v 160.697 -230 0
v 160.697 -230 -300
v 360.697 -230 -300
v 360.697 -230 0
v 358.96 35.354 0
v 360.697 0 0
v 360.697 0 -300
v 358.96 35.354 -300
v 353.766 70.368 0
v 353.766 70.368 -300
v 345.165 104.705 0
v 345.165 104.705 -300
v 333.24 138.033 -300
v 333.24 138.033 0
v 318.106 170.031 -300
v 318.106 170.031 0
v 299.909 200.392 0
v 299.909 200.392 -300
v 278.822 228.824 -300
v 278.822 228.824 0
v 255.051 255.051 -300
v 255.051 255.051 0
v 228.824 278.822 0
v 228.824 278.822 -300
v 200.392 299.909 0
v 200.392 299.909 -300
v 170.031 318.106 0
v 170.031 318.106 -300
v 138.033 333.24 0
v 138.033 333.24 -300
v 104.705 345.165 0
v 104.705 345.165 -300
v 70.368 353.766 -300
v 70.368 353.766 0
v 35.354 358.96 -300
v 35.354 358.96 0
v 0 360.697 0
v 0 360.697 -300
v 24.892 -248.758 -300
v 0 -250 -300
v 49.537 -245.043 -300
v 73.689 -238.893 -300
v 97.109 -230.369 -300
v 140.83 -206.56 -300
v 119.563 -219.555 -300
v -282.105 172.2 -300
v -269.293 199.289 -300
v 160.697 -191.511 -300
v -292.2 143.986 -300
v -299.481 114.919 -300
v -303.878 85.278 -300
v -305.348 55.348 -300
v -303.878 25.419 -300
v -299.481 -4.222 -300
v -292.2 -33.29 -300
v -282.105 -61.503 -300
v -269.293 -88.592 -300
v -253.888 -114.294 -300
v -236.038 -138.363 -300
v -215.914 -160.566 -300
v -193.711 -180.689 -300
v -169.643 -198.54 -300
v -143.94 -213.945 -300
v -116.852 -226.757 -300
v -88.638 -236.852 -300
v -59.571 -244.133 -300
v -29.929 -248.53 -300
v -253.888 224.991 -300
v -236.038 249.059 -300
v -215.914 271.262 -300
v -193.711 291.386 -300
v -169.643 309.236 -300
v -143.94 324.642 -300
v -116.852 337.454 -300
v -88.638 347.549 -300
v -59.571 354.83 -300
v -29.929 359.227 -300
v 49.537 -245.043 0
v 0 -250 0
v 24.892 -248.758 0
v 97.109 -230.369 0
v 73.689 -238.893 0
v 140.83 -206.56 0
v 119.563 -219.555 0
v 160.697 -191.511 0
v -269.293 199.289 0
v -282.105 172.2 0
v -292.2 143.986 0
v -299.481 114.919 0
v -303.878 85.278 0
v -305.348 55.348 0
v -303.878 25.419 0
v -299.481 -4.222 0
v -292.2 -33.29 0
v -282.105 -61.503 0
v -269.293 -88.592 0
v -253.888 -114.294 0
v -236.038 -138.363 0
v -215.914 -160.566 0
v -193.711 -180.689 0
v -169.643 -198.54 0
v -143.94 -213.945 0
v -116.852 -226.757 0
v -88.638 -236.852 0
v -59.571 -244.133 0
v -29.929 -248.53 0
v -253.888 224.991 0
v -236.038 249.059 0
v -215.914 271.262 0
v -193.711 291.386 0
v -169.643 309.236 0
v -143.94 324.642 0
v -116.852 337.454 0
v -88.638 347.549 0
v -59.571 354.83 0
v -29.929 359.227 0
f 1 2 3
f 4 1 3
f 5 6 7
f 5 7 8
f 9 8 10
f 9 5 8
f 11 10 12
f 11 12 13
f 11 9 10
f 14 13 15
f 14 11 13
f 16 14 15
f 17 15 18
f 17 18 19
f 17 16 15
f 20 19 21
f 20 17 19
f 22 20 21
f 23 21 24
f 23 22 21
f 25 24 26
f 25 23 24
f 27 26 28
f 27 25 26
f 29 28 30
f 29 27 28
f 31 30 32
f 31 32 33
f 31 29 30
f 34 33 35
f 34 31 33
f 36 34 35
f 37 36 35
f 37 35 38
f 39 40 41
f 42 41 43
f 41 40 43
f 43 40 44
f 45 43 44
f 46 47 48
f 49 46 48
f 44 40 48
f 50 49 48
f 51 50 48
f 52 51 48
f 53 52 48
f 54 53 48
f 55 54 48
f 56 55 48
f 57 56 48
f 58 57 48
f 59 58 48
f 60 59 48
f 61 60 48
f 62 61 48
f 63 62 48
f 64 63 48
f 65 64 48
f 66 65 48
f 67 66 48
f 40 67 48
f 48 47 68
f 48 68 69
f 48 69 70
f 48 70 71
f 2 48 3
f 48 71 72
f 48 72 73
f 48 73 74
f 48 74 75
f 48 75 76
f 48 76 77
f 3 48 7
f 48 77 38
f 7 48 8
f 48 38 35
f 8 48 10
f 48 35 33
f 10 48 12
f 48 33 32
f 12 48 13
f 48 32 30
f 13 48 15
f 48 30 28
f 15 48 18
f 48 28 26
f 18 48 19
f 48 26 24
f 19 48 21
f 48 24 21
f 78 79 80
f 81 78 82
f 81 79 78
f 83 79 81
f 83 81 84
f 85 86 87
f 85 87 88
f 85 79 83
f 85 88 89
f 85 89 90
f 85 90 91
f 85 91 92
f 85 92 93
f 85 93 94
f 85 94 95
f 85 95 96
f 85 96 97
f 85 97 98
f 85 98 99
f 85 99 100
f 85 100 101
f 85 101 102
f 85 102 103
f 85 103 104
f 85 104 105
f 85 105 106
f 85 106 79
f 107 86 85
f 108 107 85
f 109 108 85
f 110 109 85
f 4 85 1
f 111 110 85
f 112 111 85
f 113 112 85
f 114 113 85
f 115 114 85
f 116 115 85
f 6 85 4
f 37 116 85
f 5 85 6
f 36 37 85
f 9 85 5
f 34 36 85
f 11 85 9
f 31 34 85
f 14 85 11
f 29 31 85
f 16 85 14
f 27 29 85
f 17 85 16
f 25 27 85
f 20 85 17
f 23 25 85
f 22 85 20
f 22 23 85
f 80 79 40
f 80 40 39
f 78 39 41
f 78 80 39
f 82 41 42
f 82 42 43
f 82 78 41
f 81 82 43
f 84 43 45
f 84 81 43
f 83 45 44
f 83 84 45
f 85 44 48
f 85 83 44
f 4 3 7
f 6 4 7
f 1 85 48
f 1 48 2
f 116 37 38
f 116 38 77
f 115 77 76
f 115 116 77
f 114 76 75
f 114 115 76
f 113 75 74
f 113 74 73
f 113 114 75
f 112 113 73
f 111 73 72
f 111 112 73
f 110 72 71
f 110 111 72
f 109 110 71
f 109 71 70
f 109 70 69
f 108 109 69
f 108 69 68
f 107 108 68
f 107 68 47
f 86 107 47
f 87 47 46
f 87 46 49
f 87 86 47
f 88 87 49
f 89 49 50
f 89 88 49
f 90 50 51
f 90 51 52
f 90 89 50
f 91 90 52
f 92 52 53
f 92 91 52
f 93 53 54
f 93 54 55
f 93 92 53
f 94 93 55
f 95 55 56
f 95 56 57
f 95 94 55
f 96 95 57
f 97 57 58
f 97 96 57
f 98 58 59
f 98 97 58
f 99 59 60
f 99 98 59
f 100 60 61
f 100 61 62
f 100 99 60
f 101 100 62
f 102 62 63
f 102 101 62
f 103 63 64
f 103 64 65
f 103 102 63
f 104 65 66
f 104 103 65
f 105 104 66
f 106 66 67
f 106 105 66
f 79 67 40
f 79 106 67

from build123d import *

# Parameters (mm, degrees)
F1_DEPTH = 300


with BuildPart() as f1:
    # F0 (on Top) → F1 (new body)
    with BuildSketch(Plane.XY):
        with BuildLine():
            ThreePointArc((0, 360.696902), (-305.348451, 55.348451), (0, -250))
            ThreePointArc((0, -250), (85.505036, -234.923155), (160.696902, -191.511111))
            Line((160.696902, -191.511111), (160.696902, -230))
            Line((160.696902, -230), (360.696902, -230))
            Line((360.696902, -230), (360.696902, 0))
            ThreePointArc((360.696902, 0), (255.051226, 255.051226), (0, 360.696902))
        make_face()
    extrude(amount=-F1_DEPTH)


solid = f1.part
